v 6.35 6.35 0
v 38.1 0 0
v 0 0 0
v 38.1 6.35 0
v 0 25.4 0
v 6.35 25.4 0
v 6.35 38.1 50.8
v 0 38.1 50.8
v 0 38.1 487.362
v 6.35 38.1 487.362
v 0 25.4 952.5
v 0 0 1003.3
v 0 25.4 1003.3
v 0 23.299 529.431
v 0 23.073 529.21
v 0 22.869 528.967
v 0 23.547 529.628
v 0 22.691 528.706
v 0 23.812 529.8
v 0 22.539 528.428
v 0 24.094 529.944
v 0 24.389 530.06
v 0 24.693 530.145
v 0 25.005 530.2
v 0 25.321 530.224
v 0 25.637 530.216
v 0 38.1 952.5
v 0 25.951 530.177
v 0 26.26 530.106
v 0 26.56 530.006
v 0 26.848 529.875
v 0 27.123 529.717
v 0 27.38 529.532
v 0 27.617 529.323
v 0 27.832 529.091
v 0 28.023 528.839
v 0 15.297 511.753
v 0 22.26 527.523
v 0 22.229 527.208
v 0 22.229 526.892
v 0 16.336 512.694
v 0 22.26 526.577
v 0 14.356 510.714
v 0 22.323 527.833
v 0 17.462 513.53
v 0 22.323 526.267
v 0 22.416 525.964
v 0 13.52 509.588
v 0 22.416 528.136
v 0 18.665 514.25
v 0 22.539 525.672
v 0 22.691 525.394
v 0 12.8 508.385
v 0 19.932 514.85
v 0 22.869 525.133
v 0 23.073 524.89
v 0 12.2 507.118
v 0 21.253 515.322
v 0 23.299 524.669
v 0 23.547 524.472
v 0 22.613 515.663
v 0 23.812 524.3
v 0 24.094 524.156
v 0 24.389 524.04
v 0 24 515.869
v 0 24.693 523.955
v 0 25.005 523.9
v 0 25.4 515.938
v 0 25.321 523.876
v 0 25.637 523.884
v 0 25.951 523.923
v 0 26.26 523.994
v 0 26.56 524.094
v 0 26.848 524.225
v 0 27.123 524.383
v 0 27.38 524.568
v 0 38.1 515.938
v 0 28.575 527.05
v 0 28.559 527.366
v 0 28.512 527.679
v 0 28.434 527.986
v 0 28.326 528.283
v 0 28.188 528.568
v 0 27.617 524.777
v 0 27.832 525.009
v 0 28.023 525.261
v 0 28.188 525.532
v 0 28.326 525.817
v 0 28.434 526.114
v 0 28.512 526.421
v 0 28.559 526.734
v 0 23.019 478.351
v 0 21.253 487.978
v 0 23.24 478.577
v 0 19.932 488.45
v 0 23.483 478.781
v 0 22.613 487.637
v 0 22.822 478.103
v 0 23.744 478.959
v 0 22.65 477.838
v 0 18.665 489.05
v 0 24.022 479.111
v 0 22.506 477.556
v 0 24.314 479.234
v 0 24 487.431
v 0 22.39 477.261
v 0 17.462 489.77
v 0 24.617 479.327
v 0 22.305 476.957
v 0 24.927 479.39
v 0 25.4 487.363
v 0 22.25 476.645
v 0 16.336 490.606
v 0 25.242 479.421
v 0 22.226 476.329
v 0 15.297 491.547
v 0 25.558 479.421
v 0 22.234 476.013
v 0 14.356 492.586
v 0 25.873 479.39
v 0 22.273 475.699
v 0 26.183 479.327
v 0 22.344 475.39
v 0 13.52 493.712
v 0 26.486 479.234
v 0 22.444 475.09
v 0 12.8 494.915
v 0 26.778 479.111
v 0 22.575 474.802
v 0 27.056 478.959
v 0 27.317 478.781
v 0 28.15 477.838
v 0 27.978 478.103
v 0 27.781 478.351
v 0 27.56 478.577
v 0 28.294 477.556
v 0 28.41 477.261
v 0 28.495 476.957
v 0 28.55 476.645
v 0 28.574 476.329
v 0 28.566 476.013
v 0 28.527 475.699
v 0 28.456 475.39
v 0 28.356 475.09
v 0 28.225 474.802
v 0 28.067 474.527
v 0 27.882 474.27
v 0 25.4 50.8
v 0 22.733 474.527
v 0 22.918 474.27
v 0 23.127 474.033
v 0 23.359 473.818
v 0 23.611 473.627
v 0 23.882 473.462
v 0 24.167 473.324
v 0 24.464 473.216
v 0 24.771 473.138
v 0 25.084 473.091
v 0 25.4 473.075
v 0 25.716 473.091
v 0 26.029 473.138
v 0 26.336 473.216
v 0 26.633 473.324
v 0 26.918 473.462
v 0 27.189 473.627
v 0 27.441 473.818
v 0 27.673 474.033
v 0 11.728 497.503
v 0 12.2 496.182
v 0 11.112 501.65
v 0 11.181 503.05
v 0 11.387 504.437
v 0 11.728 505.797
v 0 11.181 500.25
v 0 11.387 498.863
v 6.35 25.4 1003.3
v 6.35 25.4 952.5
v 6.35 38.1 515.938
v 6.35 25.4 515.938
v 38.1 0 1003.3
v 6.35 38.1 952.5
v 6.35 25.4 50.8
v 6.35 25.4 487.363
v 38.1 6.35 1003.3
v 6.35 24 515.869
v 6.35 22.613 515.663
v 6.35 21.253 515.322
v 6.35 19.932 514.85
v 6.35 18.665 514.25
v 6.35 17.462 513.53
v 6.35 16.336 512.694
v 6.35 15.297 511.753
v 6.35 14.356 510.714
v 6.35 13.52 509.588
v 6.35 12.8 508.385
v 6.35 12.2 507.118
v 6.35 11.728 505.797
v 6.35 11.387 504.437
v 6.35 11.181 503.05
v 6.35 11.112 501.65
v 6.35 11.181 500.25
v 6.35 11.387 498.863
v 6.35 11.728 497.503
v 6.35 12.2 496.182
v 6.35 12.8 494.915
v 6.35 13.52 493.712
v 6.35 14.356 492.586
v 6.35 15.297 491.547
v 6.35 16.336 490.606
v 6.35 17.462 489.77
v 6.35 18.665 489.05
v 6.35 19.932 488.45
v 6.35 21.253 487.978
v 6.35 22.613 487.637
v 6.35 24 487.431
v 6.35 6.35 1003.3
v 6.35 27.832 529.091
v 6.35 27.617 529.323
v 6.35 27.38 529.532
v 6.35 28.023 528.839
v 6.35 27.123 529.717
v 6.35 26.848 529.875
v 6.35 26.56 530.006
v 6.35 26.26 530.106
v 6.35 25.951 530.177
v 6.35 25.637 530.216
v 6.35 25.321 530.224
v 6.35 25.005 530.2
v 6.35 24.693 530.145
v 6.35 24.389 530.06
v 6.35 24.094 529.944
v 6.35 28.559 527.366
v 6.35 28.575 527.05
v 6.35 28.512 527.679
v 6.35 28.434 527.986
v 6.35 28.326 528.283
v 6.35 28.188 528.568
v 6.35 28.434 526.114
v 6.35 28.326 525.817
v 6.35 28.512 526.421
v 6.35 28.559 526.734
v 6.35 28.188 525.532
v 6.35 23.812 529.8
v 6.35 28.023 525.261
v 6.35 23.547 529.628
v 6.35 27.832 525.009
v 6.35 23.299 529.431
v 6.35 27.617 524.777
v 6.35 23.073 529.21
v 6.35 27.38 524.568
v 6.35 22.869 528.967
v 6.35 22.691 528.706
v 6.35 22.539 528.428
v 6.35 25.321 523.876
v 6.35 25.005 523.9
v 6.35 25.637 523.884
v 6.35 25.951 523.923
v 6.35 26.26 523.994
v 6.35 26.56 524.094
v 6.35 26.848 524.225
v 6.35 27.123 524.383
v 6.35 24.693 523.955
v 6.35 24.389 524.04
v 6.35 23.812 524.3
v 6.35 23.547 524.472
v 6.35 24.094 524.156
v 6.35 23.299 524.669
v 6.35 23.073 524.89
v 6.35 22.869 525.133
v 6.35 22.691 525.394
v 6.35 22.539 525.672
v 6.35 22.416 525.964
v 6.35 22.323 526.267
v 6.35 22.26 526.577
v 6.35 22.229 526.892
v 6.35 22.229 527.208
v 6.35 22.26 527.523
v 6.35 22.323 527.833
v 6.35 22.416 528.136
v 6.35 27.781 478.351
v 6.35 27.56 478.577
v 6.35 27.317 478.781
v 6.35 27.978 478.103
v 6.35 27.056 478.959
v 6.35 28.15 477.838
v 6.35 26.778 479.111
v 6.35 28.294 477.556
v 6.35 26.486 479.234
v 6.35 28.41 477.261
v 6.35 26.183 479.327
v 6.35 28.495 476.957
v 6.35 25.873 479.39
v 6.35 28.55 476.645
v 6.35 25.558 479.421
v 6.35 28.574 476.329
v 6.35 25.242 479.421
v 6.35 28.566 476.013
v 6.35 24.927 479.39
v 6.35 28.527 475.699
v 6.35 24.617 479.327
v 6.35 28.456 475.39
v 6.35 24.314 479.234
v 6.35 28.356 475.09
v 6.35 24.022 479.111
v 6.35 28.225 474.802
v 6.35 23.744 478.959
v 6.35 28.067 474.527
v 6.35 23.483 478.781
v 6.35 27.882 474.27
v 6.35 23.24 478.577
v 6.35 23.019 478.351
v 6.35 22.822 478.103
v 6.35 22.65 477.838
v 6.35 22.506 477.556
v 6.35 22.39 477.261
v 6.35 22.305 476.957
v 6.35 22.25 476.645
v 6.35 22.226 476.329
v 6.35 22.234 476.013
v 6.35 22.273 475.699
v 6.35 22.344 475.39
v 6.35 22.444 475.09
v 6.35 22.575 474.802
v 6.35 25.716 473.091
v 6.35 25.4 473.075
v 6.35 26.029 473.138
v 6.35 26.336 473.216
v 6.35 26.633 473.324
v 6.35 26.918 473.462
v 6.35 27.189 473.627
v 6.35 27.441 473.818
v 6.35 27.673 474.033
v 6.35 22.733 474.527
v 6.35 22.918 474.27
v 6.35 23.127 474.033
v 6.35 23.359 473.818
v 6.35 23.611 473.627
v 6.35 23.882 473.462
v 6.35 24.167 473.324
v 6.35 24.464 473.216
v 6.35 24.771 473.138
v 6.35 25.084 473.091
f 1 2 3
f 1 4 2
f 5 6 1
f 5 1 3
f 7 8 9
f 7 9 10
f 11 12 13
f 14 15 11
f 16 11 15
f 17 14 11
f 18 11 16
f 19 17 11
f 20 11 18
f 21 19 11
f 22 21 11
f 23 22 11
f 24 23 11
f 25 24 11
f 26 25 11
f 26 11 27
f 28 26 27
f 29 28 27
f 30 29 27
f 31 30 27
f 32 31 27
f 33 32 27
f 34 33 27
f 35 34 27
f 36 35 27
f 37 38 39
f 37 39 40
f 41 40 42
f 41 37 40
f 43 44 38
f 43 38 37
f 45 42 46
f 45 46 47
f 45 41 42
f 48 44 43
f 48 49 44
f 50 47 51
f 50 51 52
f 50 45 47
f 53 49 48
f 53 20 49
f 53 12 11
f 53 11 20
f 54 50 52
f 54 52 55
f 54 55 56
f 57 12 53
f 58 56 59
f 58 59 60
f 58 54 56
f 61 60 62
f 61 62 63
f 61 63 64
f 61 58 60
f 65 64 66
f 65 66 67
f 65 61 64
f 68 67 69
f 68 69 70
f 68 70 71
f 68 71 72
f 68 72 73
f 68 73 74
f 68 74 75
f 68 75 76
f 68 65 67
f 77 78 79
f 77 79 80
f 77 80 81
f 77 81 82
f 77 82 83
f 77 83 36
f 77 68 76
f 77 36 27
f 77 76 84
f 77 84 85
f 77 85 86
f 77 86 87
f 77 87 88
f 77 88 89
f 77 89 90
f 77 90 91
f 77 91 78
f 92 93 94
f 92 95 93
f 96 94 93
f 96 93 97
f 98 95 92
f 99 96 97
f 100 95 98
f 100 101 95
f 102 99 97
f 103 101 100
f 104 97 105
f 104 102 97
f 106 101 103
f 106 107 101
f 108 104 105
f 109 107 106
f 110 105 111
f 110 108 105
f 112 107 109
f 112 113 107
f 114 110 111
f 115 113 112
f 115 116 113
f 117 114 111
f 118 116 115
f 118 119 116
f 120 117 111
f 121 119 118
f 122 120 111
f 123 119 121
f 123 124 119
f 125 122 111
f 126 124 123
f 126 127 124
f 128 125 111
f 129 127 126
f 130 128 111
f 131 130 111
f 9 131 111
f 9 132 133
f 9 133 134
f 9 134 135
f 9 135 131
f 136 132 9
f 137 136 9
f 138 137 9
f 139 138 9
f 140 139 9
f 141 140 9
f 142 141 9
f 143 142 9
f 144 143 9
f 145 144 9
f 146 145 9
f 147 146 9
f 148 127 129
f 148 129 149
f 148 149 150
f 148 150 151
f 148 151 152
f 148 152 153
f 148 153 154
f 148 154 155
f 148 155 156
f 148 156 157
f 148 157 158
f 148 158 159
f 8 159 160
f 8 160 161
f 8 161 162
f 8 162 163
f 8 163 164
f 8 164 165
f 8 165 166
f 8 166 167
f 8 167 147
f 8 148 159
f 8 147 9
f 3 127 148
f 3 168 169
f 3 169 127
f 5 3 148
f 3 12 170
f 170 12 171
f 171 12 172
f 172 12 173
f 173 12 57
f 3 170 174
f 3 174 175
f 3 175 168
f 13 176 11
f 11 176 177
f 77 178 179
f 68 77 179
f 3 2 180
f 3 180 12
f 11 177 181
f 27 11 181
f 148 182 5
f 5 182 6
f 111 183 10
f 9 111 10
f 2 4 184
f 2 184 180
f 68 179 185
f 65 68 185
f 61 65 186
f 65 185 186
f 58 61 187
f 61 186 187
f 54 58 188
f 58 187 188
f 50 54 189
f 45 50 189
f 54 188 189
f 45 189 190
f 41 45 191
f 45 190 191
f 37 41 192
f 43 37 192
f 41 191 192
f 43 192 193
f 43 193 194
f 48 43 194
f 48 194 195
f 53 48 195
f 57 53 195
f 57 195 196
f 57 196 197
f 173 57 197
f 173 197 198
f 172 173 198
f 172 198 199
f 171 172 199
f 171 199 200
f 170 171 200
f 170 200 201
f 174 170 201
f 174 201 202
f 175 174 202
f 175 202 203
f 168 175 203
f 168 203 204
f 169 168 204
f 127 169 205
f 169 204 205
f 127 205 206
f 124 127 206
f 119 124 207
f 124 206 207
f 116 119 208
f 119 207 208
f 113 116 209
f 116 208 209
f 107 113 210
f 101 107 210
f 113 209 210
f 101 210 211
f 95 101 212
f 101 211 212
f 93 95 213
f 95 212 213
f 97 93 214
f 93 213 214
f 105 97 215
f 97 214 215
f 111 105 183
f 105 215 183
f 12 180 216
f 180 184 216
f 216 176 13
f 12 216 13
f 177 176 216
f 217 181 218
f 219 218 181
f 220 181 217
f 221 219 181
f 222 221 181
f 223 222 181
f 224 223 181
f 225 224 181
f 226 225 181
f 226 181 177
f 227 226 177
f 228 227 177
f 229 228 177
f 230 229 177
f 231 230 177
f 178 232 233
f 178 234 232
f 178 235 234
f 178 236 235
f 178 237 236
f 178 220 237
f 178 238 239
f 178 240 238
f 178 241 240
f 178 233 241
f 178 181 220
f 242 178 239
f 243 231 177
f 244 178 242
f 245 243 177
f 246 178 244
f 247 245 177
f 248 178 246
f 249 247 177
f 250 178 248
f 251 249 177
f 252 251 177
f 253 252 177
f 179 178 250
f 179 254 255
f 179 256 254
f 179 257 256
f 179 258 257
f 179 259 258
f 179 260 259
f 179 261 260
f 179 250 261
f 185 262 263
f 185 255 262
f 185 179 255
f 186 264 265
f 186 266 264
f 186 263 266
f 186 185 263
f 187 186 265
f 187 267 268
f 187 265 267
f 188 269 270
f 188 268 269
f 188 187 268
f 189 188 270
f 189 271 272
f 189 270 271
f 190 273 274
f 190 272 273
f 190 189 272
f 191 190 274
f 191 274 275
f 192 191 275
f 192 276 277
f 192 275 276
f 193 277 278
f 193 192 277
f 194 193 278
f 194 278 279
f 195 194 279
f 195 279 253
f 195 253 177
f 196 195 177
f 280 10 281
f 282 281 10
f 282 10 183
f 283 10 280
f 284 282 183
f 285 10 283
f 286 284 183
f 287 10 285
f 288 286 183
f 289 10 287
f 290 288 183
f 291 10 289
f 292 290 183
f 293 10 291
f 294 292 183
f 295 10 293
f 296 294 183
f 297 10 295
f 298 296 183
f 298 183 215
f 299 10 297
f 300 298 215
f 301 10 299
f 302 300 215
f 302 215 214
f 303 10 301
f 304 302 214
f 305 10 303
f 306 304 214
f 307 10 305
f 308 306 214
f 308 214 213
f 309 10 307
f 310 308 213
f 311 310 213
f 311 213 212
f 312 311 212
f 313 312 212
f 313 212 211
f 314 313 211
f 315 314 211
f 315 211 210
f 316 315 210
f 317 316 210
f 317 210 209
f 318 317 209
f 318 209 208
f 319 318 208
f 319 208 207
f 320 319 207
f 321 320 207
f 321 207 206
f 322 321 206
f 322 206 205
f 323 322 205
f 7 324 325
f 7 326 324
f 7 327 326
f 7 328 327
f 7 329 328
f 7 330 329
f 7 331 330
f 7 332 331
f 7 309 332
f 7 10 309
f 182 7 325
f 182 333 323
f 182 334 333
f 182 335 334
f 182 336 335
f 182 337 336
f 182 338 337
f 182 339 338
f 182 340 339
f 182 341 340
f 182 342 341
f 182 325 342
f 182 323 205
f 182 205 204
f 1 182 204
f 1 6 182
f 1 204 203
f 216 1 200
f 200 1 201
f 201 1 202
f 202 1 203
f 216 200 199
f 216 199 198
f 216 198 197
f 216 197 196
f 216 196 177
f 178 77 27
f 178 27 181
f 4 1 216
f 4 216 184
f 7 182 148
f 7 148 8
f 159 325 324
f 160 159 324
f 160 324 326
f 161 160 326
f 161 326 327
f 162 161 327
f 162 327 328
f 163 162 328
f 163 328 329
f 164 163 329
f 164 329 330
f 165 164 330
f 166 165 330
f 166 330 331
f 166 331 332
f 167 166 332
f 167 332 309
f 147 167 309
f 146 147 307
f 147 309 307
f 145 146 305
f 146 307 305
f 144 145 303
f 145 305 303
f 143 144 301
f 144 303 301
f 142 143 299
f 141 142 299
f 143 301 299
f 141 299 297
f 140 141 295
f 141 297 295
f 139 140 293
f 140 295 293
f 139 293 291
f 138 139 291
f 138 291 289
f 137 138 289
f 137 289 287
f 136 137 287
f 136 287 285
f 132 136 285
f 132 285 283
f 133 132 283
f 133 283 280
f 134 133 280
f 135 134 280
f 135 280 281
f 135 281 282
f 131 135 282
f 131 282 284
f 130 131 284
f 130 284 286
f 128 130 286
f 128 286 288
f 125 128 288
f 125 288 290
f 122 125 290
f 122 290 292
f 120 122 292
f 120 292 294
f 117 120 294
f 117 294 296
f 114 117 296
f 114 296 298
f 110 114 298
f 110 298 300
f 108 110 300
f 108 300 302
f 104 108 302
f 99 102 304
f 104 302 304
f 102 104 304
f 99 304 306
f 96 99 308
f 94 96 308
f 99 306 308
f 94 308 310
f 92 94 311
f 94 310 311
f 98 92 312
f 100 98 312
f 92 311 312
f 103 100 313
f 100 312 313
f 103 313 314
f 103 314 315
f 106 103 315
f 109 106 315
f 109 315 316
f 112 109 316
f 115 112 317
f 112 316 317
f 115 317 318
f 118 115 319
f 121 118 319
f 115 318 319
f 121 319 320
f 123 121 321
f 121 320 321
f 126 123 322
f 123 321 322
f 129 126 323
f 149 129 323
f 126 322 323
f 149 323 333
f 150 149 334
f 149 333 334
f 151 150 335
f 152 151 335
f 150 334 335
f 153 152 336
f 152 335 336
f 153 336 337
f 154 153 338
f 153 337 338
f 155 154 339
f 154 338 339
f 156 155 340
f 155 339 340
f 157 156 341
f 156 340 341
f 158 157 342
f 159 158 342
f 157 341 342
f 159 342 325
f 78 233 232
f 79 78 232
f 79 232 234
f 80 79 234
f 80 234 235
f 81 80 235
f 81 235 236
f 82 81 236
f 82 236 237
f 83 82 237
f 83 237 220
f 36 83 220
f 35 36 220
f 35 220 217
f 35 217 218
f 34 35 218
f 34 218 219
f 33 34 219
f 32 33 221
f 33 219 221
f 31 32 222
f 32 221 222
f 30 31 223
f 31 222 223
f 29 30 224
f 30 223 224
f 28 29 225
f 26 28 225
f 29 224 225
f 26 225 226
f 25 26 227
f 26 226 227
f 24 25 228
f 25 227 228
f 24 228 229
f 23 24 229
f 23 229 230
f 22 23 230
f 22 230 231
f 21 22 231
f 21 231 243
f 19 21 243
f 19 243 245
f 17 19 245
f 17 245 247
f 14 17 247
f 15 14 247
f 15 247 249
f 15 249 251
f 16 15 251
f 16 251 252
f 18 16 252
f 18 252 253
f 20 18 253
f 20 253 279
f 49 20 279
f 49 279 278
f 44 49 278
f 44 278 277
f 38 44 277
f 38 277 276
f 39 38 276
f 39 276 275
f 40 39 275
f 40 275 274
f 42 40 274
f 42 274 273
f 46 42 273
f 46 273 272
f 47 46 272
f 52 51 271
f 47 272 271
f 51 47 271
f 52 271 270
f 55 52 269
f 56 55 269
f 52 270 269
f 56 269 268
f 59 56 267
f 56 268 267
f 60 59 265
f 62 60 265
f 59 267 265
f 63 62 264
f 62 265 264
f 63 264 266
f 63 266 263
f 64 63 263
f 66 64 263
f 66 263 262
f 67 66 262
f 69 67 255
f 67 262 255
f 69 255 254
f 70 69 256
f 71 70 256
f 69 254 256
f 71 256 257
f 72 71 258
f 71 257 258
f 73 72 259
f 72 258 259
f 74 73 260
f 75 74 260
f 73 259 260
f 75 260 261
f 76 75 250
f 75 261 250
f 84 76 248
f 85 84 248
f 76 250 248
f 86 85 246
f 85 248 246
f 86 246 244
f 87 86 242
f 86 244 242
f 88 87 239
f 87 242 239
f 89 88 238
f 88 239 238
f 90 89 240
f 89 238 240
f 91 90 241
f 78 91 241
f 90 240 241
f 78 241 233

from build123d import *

# Parameters (mm, degrees)
BOSS_EXTRUDE1_DEPTH = 1003.3
CUT_EXTRUDE1_REACH  = 1006.525
SKETCH2_R           = 3.175
SKETCH3_W           = 50.8
SKETCH3_H           = 12.7
CUT_EXTRUDE2_DEPTH  = 1005.525043242


with BuildPart() as part:
    # Sketch1 → Boss-Extrude1 (new body)
    with BuildSketch(Plane.XY):
        Polygon((0, 0), (0, 38.1), (6.35, 38.1), (6.35, 6.35), (38.1, 6.35), (38.1, 0), align=None)
    extrude(amount=BOSS_EXTRUDE1_DEPTH)

    # Sketch2 → Cut-Extrude1 (cut, up to next)
    with BuildSketch(Plane(origin=(6.35, 0, 0), x_dir=(0, 0, -1), z_dir=(1, 0, 0)), mode=Mode.PRIVATE) as cut_extrude1_sk1:
        with BuildLine():
            Line((-515.9375, 38.1), (-515.9375, 25.4))
            ThreePointArc((-515.9375, 25.4), (-501.65, 11.1125), (-487.3625, 25.4))
            Line((-487.3625, 25.4), (-487.3625, 38.1))
            Line((-487.3625, 38.1), (-515.9375, 38.1))
        make_face()
    cut_extrude1_tool1 = extrude(cut_extrude1_sk1.sketch, amount=-CUT_EXTRUDE1_REACH, mode=Mode.PRIVATE) & part.part
    # Sketch2 → Cut-Extrude1 (cut, up to next)
    with BuildSketch(Plane(origin=(6.35, 0, 0), x_dir=(0, 0, -1), z_dir=(1, 0, 0)), mode=Mode.PRIVATE) as cut_extrude1_sk2:
        with Locations(Location((-527.05, 25.4, 0), (0, 0, 90))):
            Circle(SKETCH2_R)
    cut_extrude1_tool2 = extrude(cut_extrude1_sk2.sketch, amount=-CUT_EXTRUDE1_REACH, mode=Mode.PRIVATE) & part.part
    # Sketch2 → Cut-Extrude1 (cut, up to next)
    with BuildSketch(Plane(origin=(6.35, 0, 0), x_dir=(0, 0, -1), z_dir=(1, 0, 0)), mode=Mode.PRIVATE) as cut_extrude1_sk3:
        with Locations((-476.25, 25.4)):
            Circle(SKETCH2_R)
    cut_extrude1_tool3 = extrude(cut_extrude1_sk3.sketch, amount=-CUT_EXTRUDE1_REACH, mode=Mode.PRIVATE) & part.part
    add(cut_extrude1_tool1.solids().sort_by_distance((6.35, 25.926758, 501.65))[0], mode=Mode.SUBTRACT)
    add(cut_extrude1_tool2.solids().sort_by_distance((6.35, 25.4, 527.05))[0], mode=Mode.SUBTRACT)
    add(cut_extrude1_tool3.solids().sort_by_distance((6.35, 25.4, 476.25))[0], mode=Mode.SUBTRACT)

    # Sketch3 → Cut-Extrude2 (cut, through all)
    with BuildSketch(Plane(origin=(6.35, 0, 0), x_dir=(0, 0, -1), z_dir=(1, 0, 0))):
        with Locations((-25.4, 31.75)):
            Rectangle(SKETCH3_W, SKETCH3_H)
        with Locations((-977.9, 31.75)):
            Rectangle(SKETCH3_W, SKETCH3_H)
    extrude(amount=-CUT_EXTRUDE2_DEPTH, mode=Mode.SUBTRACT)


solid = part.part
